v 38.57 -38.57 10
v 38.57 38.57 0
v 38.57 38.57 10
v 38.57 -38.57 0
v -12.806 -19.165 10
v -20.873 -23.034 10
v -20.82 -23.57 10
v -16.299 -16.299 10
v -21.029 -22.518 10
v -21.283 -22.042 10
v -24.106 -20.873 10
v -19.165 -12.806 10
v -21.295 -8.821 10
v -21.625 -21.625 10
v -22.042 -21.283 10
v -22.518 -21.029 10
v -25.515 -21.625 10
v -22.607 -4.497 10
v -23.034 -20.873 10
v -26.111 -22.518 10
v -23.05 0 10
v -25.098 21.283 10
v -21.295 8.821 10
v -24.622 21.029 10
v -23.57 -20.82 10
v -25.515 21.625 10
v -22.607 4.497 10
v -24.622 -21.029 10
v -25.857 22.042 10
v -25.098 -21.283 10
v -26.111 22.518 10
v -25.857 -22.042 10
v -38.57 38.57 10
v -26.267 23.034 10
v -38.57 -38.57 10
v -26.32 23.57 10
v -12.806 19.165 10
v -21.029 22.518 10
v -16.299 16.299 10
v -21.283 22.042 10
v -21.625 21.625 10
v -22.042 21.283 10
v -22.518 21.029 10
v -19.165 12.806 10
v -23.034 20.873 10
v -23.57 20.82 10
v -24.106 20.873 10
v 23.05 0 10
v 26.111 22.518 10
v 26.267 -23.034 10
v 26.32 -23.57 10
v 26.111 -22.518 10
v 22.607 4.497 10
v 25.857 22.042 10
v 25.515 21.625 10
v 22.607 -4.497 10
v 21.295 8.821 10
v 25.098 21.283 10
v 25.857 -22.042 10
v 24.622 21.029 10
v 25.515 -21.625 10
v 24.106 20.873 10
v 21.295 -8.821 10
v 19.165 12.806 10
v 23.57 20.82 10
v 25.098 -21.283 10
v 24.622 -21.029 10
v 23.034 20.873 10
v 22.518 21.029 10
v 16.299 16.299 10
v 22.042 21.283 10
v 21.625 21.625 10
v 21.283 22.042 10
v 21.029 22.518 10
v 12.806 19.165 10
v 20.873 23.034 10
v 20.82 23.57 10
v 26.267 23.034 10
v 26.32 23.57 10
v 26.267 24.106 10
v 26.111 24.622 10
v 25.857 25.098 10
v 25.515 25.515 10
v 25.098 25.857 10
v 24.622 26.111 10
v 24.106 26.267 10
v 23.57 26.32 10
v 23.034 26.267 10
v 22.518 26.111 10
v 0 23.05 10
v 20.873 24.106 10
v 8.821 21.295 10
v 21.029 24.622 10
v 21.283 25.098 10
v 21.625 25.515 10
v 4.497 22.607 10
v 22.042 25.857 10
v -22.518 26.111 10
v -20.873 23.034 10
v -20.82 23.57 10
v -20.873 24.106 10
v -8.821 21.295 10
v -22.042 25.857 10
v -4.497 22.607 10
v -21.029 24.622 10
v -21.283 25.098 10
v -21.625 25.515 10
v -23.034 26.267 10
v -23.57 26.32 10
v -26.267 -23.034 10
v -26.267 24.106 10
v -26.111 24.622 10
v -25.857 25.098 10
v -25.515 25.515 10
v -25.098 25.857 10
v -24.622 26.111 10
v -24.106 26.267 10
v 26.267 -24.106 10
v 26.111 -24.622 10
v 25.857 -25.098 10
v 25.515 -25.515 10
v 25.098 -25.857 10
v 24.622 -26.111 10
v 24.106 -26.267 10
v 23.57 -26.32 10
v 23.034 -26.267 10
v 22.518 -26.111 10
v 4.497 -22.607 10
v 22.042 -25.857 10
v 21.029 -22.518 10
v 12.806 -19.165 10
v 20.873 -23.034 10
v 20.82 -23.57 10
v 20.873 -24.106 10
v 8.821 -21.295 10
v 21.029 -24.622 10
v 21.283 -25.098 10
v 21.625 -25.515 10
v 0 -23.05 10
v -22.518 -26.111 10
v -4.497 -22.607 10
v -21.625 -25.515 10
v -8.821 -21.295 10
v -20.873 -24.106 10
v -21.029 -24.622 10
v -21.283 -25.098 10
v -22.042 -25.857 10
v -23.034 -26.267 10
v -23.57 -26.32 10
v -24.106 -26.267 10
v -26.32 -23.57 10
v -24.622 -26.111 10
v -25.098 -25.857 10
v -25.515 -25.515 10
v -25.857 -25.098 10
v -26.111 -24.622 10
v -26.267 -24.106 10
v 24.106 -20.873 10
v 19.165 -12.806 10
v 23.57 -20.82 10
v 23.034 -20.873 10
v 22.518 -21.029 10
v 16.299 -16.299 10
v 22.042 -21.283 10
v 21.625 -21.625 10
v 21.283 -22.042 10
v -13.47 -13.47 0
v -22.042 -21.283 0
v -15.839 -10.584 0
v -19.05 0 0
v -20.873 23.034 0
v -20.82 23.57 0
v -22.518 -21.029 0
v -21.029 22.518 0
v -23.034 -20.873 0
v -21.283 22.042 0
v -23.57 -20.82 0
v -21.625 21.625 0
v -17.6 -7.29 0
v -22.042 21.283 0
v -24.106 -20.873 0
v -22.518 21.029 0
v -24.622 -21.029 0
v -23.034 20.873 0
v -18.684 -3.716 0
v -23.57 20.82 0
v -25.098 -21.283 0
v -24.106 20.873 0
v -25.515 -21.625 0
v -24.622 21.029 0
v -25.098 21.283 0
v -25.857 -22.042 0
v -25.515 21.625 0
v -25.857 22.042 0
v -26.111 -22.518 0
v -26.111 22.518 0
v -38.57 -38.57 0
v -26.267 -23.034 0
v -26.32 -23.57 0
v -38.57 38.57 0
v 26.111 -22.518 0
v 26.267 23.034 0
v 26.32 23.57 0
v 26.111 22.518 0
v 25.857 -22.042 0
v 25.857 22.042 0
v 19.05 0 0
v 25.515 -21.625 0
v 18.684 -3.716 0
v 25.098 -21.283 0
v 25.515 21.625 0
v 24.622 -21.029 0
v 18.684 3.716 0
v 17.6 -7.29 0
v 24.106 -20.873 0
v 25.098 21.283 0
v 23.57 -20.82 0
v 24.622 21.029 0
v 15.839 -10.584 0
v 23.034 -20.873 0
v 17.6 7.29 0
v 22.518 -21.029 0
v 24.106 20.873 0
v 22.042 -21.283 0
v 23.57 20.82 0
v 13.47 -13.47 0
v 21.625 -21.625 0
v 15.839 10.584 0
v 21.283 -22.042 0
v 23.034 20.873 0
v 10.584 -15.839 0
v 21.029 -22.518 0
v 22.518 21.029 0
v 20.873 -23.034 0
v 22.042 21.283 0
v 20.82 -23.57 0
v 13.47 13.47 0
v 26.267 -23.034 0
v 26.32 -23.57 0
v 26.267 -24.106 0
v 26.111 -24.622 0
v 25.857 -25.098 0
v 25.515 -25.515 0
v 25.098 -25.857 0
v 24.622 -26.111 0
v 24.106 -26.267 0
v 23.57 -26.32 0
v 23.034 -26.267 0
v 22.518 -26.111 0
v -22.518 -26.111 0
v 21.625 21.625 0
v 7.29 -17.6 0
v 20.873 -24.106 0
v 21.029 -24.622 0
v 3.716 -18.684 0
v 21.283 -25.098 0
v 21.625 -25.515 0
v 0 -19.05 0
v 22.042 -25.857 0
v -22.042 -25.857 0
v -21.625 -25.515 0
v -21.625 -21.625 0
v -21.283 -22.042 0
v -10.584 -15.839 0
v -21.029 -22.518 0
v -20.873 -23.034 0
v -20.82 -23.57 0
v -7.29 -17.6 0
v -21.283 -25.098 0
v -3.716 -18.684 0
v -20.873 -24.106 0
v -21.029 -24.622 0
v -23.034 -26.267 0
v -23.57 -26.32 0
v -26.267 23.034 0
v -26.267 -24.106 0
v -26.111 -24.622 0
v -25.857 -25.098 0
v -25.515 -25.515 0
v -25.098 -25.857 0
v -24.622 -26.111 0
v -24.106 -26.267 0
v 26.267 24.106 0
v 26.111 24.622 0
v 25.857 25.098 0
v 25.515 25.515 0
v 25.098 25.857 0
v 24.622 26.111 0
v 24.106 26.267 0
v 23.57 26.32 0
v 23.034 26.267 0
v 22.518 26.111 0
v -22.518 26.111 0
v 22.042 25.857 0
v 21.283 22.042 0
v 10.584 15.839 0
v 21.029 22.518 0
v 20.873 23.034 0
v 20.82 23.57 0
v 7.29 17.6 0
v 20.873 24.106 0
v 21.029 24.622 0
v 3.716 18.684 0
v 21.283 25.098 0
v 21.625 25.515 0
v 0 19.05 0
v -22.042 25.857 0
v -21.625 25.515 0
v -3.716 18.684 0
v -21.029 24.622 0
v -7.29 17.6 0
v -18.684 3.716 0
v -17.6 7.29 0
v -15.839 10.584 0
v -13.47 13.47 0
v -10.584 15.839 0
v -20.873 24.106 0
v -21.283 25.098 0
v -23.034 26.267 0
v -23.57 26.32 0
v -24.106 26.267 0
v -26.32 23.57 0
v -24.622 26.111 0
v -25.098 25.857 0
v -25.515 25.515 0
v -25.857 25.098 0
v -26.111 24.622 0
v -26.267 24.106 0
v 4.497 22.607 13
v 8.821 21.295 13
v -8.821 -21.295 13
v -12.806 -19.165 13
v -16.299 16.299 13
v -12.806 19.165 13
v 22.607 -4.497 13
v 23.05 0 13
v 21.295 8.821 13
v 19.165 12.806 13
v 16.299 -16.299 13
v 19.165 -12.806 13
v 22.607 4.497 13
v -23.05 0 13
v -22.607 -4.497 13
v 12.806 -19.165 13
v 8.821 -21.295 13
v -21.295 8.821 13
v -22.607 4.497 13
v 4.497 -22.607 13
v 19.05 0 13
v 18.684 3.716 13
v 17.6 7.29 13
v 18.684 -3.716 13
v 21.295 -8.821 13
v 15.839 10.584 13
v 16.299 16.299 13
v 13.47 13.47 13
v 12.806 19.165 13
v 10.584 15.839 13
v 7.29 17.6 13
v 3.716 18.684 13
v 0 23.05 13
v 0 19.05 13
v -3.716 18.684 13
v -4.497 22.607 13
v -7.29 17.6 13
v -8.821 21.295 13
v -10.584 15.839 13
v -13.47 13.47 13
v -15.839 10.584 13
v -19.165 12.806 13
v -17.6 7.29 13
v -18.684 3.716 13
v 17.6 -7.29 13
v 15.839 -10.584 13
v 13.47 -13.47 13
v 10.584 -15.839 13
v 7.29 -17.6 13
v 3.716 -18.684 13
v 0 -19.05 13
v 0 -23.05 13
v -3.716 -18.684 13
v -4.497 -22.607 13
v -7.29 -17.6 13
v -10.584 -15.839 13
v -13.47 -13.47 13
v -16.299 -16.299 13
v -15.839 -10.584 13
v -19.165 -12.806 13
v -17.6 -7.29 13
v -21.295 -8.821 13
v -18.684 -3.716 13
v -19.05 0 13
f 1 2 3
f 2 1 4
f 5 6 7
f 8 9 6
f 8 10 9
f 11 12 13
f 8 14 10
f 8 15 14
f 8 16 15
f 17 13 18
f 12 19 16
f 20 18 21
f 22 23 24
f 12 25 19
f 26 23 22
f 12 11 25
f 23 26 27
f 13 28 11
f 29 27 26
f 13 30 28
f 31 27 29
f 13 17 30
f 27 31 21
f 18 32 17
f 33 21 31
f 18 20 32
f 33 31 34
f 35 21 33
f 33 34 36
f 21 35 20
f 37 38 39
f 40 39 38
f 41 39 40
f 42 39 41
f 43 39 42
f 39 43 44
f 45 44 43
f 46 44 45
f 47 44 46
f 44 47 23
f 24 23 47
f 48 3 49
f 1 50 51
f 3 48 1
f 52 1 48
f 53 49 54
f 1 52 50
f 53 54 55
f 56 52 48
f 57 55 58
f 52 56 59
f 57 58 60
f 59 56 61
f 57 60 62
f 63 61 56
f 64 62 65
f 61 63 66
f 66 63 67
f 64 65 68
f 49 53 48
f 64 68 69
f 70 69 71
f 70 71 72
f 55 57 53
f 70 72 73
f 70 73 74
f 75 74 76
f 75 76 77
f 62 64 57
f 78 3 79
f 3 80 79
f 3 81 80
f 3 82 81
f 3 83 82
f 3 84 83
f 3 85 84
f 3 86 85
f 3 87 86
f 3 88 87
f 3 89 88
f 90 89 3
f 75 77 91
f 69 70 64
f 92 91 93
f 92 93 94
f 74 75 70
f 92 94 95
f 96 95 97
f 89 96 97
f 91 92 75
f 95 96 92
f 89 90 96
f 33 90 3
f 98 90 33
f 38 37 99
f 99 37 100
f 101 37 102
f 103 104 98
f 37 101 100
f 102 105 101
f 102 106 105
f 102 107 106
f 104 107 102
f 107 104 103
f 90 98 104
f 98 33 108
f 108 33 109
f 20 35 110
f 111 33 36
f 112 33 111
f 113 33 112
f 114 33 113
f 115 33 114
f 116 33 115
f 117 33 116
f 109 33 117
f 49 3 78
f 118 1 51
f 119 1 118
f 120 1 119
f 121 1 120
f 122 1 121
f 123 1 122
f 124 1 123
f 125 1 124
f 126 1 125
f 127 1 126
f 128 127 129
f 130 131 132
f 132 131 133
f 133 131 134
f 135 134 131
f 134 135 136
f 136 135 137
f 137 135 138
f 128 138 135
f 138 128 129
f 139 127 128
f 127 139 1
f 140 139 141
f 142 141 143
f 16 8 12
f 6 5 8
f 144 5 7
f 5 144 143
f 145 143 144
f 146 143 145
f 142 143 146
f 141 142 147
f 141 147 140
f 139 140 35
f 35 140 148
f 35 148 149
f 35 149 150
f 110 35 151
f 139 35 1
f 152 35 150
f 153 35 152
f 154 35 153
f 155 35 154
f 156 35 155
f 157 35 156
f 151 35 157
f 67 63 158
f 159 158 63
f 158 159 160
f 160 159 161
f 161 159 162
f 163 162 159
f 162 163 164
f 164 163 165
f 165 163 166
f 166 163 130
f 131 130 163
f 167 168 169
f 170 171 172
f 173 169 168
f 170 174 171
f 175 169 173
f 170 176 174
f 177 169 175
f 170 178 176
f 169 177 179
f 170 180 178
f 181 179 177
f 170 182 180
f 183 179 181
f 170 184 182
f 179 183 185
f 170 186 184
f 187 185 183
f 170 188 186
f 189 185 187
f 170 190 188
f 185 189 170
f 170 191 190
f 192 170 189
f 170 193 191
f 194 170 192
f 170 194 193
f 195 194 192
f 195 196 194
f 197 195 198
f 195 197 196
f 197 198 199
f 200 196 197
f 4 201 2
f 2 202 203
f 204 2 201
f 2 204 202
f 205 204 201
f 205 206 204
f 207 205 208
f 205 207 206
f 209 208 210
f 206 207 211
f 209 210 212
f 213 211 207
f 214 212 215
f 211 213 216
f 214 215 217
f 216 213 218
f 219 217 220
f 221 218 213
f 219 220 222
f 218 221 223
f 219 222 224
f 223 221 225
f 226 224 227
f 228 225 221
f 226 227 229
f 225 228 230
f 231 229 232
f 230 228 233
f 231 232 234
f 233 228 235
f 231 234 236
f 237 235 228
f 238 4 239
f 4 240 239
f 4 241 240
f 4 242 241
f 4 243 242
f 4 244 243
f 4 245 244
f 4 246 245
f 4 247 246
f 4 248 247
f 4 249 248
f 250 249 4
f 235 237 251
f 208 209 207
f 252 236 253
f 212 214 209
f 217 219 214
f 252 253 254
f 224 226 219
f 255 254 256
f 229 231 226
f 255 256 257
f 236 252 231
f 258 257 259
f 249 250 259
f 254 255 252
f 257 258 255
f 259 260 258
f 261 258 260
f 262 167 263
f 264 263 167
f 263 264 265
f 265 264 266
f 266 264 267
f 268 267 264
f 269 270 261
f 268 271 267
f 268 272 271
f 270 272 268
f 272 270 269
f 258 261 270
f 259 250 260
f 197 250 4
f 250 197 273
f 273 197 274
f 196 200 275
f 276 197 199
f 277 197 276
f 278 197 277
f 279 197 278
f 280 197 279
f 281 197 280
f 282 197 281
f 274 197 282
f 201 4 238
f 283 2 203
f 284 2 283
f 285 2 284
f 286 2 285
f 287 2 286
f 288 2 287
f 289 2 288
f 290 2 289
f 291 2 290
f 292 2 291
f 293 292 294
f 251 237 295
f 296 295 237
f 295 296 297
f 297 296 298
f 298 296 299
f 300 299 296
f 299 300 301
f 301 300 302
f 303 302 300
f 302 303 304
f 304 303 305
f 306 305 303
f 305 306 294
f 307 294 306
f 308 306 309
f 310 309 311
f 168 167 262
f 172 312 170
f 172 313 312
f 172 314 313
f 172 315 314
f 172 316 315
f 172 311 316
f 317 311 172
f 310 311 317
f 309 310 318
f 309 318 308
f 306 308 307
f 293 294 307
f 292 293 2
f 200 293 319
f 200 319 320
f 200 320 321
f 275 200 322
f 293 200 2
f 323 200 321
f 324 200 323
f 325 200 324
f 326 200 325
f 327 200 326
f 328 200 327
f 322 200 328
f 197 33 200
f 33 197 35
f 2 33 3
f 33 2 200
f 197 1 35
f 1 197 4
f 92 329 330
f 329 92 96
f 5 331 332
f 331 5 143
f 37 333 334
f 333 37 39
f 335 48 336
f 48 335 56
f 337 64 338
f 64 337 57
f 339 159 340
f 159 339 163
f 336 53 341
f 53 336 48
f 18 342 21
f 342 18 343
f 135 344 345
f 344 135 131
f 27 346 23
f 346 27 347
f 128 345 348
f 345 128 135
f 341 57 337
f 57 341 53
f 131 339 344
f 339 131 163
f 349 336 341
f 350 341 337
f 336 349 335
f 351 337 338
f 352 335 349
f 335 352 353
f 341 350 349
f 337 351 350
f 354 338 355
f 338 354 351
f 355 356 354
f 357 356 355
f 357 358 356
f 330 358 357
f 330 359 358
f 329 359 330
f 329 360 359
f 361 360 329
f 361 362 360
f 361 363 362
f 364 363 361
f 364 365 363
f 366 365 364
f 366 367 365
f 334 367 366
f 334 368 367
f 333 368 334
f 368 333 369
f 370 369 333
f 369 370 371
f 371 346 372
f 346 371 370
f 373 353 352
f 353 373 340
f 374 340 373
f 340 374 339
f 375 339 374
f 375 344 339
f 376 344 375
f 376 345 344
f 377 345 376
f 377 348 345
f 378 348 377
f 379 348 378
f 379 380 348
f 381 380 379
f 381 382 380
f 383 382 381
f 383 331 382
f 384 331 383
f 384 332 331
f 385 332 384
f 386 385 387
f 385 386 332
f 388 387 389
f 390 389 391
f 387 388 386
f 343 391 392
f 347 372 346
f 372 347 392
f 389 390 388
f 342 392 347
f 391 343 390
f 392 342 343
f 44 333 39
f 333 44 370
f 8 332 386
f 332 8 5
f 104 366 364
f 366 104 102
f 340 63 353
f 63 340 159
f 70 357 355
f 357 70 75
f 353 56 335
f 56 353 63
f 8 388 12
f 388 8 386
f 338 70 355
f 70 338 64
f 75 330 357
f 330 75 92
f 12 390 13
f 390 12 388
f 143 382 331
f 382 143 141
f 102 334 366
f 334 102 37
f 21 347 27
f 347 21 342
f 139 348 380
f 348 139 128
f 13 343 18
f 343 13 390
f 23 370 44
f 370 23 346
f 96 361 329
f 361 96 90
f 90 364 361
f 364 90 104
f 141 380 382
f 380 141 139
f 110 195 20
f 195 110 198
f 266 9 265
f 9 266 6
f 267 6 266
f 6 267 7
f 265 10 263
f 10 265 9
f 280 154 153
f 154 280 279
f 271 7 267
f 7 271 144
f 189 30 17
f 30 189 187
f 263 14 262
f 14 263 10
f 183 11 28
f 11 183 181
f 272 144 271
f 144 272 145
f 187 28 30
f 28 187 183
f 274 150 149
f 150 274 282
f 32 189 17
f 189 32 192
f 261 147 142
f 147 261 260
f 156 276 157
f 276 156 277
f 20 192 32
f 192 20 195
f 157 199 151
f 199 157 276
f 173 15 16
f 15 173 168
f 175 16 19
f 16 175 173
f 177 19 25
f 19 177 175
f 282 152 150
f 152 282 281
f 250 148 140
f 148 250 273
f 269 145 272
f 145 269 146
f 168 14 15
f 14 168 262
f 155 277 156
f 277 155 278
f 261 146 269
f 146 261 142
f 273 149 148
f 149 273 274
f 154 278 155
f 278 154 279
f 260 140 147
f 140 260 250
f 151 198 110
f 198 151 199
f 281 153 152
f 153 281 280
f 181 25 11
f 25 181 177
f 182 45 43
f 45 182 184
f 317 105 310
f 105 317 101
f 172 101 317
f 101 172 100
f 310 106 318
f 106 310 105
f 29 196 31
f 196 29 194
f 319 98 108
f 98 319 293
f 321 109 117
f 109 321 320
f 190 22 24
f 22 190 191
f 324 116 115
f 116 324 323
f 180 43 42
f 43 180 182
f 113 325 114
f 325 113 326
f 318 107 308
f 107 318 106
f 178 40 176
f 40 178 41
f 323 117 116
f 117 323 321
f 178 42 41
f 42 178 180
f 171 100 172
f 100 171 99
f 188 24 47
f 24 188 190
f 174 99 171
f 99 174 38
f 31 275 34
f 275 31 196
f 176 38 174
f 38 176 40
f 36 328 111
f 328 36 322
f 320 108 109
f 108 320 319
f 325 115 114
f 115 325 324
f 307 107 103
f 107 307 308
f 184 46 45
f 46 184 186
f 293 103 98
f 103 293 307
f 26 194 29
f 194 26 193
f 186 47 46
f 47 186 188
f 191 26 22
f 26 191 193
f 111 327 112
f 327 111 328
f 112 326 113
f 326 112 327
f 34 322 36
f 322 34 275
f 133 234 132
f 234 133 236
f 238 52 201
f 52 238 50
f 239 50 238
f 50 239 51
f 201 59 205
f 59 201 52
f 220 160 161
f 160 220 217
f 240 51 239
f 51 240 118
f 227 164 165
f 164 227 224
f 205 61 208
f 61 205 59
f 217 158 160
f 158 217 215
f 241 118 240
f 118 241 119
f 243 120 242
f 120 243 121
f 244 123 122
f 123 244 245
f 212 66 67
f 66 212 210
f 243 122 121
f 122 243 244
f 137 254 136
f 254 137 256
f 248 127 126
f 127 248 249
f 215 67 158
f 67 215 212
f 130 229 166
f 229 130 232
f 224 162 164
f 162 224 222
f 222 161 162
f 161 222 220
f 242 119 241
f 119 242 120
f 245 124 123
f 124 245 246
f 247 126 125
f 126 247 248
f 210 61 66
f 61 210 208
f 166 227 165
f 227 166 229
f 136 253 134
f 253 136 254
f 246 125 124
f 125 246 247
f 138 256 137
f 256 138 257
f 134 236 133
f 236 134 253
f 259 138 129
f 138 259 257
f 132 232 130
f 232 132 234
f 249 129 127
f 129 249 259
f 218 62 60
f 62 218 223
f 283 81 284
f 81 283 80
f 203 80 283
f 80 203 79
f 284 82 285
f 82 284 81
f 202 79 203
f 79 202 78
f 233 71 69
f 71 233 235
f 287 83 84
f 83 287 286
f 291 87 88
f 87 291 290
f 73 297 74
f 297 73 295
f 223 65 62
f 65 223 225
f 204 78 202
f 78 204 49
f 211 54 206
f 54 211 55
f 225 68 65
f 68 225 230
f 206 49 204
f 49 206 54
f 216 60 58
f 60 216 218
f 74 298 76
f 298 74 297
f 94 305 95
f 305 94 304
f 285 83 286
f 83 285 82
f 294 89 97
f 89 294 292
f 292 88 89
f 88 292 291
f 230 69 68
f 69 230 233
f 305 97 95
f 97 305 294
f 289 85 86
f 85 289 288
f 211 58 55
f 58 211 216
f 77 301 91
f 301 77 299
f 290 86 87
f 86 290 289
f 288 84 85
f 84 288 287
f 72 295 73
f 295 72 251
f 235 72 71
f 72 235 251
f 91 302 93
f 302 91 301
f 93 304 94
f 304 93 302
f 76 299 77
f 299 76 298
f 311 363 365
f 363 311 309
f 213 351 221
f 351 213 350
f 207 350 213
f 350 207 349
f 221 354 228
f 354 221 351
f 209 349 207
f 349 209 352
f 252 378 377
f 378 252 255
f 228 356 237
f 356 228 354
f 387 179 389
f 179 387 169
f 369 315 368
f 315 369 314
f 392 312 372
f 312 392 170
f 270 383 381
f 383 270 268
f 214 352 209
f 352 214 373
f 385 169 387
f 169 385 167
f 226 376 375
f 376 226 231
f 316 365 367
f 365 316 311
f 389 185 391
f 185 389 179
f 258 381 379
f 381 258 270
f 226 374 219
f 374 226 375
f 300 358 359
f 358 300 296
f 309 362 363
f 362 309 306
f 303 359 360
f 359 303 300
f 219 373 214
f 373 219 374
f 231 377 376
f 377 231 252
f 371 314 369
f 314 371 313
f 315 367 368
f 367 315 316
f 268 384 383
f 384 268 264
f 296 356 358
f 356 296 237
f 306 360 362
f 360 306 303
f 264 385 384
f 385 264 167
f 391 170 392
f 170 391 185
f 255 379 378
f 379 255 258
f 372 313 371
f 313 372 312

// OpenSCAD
$fn = 32;

// ----------------------------------------------------------------------
// Motor mount plate: NEMA23, 77.14 x 77.14 x 13 mm
// ----------------------------------------------------------------------

// --- parameters (mm) ---
base_x = 77.14;           // plate length, X
base_y = 77.14;           // plate width, Y
thick = 10;               // plate thickness
bolt_pitch = 47.14;       // NEMA23 bolt spacing
motor_d = 5.5;            // NEMA23 screw clearance
boss_hole = 38.1;         // pilot boss bore
boss_d = 46.1;            // raised pilot ring
boss_h = 3;               // raised pilot ring height

module plate() {
  translate([-base_x / 2, -base_y / 2, 0]) cube([base_x, base_y, thick]);
}

module motor_holes() {
  for (sx = [-1, 1]) for (sy = [-1, 1])
    translate([sx * bolt_pitch / 2, sy * bolt_pitch / 2, -1])
      cylinder(h = thick + 2, d = motor_d);
}
module pilot_ring() {
  translate([0, 0, thick - 1]) cylinder(h = boss_h + 1, d = boss_d);
}

difference() {
  union() {
    plate();
    pilot_ring();
  }
  motor_holes();
  translate([0, 0, -1]) cylinder(h = thick + boss_h + 2, d = boss_hole);
}
